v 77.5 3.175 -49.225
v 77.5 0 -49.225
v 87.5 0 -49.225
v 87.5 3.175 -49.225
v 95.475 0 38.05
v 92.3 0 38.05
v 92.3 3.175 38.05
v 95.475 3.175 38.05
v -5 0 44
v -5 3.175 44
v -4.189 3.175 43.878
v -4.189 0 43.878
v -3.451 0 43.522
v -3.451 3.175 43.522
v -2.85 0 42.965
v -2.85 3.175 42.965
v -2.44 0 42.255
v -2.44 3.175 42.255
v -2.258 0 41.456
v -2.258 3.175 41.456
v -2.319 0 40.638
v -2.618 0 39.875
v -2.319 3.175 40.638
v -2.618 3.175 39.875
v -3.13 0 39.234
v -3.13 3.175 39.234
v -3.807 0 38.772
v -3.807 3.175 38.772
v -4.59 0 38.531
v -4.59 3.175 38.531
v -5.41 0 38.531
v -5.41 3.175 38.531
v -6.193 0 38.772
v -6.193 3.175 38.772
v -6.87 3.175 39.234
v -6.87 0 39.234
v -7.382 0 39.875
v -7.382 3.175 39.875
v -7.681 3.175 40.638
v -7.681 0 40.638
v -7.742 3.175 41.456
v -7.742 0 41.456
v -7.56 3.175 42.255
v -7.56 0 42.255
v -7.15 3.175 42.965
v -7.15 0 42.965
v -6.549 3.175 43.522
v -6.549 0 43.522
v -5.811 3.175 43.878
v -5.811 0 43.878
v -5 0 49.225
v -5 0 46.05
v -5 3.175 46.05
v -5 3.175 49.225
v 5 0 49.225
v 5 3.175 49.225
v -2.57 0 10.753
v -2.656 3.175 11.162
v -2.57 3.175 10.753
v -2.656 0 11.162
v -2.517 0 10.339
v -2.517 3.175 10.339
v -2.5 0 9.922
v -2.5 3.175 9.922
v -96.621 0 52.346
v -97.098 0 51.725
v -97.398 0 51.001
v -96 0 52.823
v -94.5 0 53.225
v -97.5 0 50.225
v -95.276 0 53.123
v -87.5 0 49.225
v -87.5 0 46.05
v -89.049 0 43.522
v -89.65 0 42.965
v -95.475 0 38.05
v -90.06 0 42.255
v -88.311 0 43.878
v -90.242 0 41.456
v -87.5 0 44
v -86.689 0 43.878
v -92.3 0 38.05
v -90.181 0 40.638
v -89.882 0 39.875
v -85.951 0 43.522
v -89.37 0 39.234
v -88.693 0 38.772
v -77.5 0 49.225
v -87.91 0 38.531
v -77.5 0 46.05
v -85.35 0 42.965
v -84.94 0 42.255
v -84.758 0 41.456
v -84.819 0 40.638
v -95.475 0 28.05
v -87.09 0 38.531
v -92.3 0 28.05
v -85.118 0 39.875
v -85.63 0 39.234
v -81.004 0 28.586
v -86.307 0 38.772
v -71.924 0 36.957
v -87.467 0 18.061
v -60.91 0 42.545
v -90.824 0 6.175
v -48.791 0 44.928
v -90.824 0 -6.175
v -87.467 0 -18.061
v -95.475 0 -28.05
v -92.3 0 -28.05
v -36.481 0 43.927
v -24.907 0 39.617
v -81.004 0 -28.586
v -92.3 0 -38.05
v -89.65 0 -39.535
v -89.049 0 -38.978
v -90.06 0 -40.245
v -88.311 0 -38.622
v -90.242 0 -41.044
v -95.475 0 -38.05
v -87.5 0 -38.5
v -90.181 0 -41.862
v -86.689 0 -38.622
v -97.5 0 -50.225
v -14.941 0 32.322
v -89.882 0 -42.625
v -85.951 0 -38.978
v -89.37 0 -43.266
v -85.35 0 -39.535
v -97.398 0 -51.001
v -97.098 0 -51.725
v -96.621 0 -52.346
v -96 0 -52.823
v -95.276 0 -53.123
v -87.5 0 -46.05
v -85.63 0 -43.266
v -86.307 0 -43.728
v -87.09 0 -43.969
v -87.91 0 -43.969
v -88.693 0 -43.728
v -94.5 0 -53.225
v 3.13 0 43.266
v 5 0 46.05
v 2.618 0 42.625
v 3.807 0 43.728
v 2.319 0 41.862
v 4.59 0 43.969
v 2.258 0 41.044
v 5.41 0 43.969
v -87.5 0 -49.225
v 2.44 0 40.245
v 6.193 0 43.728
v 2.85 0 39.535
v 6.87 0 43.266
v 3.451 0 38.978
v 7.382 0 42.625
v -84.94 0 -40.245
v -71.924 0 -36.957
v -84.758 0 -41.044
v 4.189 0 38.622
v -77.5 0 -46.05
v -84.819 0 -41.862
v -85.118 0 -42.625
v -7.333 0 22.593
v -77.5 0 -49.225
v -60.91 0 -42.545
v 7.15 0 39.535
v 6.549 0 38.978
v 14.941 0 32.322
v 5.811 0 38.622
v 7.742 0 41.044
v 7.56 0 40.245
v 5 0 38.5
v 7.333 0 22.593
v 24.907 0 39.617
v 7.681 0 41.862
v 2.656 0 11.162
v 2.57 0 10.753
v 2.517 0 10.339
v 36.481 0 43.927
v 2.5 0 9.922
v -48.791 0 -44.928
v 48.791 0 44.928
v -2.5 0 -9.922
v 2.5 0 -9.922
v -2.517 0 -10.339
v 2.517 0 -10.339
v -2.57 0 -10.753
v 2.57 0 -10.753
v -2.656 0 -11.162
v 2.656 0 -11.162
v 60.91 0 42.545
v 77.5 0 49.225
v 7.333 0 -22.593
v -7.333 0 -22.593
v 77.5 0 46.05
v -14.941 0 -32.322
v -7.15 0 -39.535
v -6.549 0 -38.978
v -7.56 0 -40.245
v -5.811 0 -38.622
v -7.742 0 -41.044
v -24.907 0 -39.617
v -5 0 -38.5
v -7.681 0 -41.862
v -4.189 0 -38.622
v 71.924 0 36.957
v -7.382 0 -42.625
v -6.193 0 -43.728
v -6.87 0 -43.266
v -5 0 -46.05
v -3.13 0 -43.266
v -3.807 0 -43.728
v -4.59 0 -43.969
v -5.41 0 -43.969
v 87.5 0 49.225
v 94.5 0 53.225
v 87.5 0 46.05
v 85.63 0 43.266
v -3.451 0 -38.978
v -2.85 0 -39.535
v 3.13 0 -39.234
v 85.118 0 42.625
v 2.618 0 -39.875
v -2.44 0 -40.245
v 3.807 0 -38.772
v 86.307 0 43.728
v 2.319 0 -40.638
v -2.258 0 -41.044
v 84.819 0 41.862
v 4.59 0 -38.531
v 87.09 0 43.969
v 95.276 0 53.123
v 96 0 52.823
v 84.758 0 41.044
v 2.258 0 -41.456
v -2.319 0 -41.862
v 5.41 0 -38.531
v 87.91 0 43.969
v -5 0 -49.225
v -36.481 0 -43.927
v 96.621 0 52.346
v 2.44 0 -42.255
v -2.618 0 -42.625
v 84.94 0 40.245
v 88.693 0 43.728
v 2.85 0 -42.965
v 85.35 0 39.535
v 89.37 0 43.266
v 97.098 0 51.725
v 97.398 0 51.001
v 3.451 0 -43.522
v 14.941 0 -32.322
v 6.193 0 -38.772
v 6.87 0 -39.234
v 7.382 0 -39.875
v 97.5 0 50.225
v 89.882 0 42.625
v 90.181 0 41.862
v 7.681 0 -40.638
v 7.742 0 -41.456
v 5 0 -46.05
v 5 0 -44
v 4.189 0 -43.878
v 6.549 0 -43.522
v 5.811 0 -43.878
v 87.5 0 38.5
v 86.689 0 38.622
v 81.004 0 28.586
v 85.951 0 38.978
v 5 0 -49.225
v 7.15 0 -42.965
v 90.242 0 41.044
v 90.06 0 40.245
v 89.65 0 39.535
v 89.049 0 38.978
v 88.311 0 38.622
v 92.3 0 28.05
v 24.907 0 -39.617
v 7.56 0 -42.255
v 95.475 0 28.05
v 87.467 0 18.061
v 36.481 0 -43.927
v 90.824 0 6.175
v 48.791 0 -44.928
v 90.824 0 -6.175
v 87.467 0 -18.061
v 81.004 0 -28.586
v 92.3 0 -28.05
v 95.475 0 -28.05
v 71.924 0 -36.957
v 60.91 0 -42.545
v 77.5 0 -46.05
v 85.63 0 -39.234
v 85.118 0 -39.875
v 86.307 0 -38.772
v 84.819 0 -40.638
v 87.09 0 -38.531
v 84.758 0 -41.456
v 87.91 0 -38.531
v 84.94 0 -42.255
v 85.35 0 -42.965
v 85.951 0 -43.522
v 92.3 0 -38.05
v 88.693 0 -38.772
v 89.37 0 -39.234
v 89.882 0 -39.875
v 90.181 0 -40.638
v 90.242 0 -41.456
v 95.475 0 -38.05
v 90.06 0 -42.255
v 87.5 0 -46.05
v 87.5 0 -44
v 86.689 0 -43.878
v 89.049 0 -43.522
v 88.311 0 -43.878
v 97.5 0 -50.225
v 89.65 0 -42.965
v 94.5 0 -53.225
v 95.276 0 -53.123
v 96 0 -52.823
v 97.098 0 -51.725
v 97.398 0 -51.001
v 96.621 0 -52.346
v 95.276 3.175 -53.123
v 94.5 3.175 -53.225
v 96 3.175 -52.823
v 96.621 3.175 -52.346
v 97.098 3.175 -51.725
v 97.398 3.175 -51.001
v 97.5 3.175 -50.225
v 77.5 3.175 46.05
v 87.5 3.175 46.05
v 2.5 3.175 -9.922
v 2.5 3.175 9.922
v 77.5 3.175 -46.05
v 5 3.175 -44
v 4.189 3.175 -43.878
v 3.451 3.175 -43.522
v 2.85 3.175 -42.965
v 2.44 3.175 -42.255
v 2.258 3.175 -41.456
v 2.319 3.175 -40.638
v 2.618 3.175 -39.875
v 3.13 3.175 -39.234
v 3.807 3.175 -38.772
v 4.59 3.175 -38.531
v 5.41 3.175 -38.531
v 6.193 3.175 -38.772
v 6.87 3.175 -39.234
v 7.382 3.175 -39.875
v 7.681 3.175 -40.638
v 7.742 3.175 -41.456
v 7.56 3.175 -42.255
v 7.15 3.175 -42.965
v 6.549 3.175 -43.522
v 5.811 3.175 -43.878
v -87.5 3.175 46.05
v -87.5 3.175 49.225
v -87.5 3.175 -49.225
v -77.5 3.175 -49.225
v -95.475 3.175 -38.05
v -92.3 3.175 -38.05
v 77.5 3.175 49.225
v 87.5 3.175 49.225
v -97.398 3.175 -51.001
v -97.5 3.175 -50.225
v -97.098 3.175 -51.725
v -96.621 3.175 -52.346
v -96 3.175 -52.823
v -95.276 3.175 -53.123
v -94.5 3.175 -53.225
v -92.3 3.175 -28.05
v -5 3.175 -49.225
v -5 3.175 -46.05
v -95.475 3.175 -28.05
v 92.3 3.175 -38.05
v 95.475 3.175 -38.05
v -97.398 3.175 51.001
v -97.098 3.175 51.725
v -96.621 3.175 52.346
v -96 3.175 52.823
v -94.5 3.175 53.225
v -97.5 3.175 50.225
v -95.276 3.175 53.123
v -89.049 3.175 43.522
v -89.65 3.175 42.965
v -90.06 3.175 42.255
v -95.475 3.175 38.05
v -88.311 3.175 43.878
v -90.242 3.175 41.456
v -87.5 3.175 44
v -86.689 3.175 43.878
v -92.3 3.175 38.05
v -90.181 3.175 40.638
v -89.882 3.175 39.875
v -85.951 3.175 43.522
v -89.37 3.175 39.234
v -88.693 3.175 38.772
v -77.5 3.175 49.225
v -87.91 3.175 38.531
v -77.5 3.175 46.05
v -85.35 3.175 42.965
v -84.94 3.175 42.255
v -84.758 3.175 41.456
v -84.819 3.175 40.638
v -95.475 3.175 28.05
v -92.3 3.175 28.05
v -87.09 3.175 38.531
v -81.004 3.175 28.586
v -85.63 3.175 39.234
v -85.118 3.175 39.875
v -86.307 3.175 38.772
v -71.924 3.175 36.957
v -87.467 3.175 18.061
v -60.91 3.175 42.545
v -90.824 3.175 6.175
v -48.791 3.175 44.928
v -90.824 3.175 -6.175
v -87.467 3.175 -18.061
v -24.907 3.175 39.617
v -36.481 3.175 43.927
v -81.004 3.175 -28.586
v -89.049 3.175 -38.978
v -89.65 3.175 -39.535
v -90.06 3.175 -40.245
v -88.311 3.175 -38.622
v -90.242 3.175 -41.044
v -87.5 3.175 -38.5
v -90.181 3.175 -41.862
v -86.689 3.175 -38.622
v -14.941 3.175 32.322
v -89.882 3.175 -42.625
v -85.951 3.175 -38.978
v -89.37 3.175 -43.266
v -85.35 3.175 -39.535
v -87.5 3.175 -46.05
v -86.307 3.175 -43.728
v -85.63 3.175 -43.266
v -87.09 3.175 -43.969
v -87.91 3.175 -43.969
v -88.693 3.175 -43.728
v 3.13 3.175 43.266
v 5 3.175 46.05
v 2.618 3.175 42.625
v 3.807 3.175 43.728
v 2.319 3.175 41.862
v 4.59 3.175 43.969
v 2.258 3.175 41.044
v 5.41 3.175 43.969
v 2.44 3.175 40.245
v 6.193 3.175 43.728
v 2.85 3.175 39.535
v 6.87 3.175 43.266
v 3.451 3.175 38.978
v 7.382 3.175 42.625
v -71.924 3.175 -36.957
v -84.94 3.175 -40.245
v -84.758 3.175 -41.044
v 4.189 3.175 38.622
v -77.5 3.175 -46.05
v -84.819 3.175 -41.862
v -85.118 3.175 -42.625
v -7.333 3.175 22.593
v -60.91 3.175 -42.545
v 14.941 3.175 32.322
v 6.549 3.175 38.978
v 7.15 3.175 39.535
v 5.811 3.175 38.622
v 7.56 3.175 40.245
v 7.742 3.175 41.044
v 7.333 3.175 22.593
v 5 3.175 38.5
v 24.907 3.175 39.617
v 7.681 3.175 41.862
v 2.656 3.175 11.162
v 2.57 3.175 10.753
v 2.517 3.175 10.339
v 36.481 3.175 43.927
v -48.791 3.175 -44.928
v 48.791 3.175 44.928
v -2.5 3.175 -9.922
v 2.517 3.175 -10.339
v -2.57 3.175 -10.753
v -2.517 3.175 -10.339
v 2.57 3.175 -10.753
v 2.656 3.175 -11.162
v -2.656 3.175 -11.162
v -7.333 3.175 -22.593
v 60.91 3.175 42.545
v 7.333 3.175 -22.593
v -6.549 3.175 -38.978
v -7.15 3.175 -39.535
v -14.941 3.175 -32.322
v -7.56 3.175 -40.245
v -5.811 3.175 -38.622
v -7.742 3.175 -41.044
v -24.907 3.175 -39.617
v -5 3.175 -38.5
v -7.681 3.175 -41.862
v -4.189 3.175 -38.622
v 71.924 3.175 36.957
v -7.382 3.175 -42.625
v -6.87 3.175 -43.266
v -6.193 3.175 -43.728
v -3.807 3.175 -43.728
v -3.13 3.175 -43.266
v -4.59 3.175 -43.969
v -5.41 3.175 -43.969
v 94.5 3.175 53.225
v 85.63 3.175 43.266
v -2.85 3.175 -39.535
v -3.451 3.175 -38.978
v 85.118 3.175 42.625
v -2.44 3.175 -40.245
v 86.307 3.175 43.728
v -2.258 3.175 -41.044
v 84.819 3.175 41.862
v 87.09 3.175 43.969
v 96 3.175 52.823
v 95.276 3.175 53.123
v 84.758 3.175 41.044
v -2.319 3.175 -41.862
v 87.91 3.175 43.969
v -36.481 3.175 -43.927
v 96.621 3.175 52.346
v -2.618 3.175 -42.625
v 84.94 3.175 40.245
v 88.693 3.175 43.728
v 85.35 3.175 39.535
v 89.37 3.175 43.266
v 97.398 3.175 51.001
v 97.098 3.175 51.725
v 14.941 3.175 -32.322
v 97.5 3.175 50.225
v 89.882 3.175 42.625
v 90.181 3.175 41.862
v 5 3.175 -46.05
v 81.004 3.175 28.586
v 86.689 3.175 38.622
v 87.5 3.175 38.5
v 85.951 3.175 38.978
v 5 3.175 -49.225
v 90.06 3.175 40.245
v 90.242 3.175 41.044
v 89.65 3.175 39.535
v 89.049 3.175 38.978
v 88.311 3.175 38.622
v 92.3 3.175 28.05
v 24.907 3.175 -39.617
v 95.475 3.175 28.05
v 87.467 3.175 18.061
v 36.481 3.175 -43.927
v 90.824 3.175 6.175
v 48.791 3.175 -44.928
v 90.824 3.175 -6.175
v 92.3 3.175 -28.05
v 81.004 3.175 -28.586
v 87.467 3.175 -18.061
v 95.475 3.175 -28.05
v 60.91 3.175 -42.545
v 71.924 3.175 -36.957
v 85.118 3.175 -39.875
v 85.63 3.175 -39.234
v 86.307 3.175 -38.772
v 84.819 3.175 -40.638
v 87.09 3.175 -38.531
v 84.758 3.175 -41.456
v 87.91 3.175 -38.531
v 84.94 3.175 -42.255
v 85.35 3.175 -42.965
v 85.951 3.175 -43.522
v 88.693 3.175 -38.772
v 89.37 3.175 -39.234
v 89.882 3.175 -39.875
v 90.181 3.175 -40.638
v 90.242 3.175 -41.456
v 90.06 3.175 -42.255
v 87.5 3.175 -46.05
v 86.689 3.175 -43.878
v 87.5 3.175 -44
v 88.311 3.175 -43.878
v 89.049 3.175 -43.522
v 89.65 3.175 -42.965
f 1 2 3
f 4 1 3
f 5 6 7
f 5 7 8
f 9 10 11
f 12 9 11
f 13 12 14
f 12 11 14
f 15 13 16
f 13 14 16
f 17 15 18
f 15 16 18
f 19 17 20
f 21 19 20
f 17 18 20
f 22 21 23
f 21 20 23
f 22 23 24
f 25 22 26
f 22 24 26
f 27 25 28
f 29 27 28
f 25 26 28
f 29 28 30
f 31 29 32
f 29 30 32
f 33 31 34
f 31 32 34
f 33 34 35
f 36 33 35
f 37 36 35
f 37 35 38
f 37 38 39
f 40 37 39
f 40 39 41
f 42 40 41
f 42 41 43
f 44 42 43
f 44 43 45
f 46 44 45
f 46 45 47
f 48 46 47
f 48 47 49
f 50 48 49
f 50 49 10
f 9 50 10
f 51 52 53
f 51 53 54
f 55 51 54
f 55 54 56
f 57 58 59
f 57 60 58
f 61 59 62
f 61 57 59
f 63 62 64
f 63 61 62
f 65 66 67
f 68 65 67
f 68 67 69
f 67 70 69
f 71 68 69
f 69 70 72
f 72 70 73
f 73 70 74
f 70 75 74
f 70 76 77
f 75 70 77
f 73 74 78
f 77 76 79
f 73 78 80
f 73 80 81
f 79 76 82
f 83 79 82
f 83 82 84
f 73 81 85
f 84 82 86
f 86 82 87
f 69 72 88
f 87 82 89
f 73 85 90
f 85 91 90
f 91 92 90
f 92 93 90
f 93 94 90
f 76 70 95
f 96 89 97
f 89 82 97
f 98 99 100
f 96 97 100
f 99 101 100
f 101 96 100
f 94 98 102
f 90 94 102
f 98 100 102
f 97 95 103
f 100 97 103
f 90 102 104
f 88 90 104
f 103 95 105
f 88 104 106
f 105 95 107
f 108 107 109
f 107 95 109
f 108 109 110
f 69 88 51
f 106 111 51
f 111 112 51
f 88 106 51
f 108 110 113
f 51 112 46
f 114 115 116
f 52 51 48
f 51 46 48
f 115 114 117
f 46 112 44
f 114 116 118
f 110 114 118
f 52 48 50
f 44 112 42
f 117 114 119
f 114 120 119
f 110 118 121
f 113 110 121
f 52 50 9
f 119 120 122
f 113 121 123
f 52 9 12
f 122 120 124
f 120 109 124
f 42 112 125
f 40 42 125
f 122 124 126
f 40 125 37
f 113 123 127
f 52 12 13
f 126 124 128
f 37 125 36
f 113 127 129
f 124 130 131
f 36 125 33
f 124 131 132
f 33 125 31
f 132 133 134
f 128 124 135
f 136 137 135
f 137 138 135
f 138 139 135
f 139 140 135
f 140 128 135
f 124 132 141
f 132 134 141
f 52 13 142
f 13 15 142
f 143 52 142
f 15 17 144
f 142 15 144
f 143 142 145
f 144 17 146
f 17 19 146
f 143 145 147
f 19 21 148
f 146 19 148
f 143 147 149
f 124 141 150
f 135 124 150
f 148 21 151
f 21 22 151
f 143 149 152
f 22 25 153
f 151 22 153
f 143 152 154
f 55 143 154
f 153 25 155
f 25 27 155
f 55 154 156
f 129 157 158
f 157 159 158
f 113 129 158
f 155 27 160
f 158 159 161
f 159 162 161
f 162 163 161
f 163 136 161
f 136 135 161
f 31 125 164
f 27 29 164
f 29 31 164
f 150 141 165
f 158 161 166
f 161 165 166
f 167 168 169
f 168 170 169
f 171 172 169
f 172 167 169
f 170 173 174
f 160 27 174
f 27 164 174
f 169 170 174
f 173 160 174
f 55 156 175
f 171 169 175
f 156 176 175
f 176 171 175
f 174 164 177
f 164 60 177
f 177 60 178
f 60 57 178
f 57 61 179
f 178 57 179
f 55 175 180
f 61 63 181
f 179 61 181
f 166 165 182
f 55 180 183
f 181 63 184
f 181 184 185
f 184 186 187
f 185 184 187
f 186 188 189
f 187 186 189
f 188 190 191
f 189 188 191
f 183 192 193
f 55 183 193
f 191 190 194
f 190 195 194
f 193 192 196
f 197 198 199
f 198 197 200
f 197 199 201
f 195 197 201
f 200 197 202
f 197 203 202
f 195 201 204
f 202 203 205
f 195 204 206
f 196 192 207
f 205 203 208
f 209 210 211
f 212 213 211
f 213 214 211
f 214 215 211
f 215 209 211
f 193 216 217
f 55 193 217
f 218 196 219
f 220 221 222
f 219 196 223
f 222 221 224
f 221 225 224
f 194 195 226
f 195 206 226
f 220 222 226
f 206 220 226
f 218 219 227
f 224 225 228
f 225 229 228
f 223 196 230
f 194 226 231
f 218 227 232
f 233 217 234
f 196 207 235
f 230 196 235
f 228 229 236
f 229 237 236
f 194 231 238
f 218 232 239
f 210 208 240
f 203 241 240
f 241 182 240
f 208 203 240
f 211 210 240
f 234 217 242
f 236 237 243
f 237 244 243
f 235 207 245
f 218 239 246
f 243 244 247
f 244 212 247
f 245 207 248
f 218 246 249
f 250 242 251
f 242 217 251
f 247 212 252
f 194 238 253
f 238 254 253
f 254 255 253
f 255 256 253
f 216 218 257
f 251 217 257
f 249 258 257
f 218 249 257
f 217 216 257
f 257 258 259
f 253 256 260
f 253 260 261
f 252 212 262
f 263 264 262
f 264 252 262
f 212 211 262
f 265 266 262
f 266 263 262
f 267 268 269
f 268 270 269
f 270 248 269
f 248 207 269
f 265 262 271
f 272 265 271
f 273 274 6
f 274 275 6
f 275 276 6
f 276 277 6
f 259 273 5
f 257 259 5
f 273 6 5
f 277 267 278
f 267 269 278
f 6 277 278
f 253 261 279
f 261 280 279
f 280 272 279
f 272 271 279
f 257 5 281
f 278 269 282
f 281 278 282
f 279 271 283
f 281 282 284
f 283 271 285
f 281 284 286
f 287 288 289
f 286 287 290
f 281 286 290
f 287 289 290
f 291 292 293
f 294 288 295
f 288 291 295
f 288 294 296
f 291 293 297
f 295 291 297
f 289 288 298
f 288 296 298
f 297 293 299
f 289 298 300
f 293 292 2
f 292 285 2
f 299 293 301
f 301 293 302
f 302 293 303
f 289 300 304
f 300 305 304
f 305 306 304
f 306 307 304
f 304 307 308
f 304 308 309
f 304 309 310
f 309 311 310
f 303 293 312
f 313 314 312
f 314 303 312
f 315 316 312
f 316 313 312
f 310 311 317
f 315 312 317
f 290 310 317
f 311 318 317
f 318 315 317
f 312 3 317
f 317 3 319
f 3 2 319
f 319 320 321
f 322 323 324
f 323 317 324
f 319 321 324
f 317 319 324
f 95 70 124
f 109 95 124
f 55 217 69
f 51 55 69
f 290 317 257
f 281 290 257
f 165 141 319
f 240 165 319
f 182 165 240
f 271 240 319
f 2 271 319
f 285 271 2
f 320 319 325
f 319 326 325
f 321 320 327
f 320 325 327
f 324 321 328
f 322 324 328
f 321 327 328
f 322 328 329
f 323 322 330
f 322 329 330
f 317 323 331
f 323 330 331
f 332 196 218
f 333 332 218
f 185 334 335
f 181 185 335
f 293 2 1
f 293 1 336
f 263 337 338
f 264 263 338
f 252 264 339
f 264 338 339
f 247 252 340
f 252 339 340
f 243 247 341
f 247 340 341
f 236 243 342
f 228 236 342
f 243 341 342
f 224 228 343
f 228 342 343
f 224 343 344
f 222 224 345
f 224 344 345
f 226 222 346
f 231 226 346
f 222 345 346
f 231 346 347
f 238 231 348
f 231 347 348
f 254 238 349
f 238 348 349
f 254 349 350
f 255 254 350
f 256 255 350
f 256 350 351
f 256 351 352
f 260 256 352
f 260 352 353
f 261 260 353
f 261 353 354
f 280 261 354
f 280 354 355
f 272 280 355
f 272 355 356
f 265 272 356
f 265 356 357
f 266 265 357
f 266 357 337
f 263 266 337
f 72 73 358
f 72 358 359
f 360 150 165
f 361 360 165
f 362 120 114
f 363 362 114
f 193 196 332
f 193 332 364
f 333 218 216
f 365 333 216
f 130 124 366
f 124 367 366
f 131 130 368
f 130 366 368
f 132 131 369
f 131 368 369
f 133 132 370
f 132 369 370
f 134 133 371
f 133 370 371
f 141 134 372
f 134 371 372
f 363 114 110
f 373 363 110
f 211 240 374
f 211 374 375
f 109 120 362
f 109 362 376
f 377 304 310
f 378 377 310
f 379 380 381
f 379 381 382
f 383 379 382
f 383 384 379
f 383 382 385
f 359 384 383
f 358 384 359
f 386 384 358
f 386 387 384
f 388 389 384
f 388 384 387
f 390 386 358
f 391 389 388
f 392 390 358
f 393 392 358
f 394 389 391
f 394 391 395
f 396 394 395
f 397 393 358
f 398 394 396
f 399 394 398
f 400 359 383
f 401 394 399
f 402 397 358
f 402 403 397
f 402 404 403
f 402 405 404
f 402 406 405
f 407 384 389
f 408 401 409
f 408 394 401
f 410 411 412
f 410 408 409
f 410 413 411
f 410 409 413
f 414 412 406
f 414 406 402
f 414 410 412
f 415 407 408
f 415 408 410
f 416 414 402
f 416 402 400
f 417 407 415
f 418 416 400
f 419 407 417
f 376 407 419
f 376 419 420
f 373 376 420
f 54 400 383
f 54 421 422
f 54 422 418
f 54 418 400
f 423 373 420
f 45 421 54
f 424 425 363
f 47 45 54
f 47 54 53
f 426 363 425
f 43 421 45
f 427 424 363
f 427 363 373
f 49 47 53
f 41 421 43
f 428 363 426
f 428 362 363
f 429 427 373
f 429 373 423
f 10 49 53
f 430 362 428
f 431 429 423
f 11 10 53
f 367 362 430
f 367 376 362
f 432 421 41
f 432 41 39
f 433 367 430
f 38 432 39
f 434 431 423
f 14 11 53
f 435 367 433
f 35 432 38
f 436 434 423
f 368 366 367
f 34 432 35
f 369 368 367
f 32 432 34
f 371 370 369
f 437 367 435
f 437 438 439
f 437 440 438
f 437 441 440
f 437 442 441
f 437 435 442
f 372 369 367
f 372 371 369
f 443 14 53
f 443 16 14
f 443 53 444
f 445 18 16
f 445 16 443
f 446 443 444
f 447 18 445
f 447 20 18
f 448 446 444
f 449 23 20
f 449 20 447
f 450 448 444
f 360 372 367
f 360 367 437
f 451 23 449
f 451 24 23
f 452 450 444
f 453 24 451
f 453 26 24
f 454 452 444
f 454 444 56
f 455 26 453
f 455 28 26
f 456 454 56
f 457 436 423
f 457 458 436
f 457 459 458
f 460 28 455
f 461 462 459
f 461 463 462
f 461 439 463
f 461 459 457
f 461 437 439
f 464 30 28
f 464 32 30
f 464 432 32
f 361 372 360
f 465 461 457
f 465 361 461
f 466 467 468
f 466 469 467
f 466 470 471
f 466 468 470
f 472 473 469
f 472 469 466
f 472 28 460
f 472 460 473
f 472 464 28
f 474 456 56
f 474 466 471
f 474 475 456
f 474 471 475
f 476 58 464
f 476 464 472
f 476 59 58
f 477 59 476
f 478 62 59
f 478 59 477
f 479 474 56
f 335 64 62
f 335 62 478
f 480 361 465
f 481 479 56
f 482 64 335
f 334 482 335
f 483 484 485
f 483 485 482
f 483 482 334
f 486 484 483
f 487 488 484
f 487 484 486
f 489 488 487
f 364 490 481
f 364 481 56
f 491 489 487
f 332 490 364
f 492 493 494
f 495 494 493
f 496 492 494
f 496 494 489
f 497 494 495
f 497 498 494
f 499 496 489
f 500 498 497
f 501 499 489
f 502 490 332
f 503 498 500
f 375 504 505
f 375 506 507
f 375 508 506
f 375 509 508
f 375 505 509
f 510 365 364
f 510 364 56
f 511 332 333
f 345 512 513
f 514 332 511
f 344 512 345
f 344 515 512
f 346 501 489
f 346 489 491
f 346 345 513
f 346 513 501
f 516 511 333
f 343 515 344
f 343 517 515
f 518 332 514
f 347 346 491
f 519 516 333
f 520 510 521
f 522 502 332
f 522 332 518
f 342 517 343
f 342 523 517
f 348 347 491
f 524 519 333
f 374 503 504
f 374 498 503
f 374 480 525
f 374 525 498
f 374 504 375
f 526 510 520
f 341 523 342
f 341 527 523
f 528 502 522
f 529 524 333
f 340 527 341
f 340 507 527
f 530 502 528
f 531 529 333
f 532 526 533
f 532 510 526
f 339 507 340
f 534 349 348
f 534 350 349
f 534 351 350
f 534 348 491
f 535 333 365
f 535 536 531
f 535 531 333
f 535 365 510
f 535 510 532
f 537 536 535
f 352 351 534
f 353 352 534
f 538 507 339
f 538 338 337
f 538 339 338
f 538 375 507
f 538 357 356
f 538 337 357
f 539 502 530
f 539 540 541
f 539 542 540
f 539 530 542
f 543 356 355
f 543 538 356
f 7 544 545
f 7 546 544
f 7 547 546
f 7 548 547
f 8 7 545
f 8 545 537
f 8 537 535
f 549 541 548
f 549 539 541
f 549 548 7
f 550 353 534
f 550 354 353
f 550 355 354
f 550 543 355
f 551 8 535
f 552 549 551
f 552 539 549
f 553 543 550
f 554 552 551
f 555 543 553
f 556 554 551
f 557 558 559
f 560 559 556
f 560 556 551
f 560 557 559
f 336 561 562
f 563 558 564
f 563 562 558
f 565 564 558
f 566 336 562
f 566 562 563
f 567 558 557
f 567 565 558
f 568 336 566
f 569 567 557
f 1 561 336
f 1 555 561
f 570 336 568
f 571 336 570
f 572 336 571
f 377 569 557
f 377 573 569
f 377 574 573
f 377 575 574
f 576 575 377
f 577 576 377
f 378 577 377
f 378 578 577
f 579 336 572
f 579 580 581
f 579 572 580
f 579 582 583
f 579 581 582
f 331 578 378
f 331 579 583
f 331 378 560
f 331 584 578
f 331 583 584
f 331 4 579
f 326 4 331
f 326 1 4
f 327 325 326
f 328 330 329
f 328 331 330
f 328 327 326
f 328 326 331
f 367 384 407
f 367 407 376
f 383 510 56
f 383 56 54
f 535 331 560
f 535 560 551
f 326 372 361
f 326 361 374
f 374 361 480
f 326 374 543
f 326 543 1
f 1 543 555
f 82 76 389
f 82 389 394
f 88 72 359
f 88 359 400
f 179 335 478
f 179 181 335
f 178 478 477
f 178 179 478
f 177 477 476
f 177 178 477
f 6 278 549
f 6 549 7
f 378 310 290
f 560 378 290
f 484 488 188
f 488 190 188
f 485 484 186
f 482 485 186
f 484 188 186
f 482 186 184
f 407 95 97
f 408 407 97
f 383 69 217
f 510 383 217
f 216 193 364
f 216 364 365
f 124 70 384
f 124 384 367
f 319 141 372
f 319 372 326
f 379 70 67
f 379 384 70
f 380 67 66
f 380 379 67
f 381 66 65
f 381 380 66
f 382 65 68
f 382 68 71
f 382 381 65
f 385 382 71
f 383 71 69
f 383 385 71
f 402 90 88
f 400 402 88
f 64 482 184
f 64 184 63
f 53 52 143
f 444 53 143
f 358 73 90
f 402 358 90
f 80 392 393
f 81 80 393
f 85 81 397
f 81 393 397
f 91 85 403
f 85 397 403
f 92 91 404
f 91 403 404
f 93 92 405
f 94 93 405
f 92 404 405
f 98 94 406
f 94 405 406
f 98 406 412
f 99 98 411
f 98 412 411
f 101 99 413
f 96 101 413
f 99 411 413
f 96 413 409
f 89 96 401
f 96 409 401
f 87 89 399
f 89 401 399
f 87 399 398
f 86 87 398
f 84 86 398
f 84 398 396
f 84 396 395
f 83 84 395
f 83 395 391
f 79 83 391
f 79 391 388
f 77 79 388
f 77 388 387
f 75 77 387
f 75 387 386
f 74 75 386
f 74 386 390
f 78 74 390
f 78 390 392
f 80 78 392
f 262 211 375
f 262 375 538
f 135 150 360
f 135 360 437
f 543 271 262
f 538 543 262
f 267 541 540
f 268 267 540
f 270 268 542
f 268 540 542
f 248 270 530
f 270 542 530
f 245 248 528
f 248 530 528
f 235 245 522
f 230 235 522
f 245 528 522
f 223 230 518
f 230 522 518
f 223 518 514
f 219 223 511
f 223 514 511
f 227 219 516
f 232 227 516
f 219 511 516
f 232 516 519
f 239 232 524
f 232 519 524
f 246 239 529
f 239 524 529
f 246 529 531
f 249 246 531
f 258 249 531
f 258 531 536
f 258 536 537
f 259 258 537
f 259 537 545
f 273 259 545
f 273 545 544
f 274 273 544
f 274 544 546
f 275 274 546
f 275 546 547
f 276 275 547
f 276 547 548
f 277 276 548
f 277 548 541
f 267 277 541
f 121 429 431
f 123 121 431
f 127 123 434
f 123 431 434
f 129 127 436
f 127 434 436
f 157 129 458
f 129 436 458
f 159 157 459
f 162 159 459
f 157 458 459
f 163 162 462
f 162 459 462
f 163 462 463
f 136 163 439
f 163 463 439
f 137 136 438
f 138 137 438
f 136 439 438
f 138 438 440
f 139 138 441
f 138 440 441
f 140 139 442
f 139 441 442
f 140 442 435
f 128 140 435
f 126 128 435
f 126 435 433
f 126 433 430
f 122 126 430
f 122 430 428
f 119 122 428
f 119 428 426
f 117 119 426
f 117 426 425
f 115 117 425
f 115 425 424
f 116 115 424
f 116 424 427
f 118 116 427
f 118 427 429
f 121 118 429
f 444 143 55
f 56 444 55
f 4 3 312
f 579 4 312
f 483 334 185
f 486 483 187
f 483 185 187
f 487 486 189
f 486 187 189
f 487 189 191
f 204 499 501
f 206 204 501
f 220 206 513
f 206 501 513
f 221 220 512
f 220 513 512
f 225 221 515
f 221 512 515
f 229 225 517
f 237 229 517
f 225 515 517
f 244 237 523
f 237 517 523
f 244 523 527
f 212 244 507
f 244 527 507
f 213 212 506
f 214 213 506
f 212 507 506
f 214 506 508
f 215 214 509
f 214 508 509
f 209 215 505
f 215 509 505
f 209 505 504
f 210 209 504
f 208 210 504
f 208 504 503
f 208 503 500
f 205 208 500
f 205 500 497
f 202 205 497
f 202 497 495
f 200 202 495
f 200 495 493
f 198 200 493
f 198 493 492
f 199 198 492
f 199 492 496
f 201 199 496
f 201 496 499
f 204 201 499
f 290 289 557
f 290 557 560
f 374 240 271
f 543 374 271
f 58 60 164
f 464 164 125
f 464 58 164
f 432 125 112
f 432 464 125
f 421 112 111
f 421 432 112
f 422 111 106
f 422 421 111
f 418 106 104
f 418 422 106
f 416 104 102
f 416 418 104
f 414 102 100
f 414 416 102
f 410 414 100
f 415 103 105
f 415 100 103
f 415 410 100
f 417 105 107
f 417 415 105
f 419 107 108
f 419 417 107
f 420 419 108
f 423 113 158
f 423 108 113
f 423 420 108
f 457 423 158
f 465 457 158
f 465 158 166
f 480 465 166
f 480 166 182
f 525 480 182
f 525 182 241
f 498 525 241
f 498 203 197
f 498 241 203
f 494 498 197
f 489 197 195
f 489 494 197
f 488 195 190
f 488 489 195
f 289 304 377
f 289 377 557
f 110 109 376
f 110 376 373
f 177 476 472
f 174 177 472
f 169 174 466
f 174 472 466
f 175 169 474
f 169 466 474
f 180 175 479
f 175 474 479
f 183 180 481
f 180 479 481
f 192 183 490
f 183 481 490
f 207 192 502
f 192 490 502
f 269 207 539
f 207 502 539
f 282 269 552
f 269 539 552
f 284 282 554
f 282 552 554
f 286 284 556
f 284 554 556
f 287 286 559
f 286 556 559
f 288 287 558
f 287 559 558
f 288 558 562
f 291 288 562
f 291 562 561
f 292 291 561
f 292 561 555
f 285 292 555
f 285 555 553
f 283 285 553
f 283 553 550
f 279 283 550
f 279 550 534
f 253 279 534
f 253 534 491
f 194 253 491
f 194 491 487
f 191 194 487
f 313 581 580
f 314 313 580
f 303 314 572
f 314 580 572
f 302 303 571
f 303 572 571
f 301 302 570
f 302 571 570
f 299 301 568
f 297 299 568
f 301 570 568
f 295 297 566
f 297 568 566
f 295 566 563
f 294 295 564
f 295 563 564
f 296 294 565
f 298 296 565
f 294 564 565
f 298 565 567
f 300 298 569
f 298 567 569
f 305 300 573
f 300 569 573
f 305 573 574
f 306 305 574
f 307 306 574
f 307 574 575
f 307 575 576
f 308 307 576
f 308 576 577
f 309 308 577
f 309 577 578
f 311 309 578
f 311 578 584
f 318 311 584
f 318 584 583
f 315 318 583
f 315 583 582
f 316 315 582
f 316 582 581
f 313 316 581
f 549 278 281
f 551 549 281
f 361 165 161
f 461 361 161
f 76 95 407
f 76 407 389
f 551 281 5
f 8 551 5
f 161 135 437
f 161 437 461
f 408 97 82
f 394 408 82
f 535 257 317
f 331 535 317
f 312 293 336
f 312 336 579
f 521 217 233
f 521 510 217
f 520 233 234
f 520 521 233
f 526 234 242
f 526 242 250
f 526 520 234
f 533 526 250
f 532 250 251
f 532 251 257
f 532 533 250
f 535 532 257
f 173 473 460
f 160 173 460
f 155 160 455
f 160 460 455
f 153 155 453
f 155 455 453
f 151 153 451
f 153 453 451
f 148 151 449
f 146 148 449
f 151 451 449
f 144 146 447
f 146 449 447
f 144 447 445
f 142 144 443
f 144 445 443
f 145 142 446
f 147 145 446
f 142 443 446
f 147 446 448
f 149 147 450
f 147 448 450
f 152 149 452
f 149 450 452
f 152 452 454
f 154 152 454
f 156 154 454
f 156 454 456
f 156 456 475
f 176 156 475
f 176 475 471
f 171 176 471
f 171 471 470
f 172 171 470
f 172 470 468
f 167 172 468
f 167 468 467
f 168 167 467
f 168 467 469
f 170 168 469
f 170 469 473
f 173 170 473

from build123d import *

# Parameters (mm, degrees)
SKETCH1_W           = 195
SKETCH1_H           = 106.45
BOSS_EXTRUDE1_DEPTH = 3.175
SKETCH2_R           = 2.75
CUT_EXTRUDE1_DEPTH  = 112.127095031
FILLET1_R           = 5
FILLET2_R           = 3
SKETCH4_W           = 10
SKETCH4_H           = 3.175
SKETCH4_W_2         = 3.175
SKETCH4_H_2         = 10
CUT_EXTRUDE2_DEPTH  = 112.127095031


with BuildPart() as part:
    # Sketch1 → Boss-Extrude1 (new body)
    with BuildSketch(Plane(origin=(0, 0, 0), x_dir=(1, 0, 0), z_dir=(0, 1, 0))):
        Rectangle(SKETCH1_W, SKETCH1_H)
    extrude(amount=BOSS_EXTRUDE1_DEPTH)

    # Sketch2 → Cut-Extrude1 (cut, through all)
    with BuildSketch(Plane(origin=(0, 3.175, 0), x_dir=(1, 0, 0), z_dir=(0, 1, 0))):
        with Locations((-87.5, 41.25)):
            Circle(SKETCH2_R)
        with Locations((-5, 41.25)):
            Circle(SKETCH2_R)
        with Locations((-5, -41.25)):
            Circle(SKETCH2_R)
        with Locations((-87.5, -41.25)):
            Circle(SKETCH2_R)
        with Locations((5, 41.25)):
            Circle(SKETCH2_R)
        with Locations((5, -41.25)):
            Circle(SKETCH2_R)
        with Locations((87.5, -41.25)):
            Circle(SKETCH2_R)
        with Locations((87.5, 41.25)):
            Circle(SKETCH2_R)
        with BuildLine():
            Line((-2.5, 10.532687216), (-2.5, -10.532687216))
            ThreePointArc((-2.5, -10.532687216), (-91.25, 0), (-2.5, 10.532687216))
        make_face()
        with BuildLine():
            Line((2.5, 10.532687216), (2.5, -10.532687216))
            ThreePointArc((2.5, -10.532687216), (91.25, 0), (2.5, 10.532687216))
        make_face()
    extrude(amount=-CUT_EXTRUDE1_DEPTH, mode=Mode.SUBTRACT)

    # Fillet1
    fillet1_edges = [part.edges().sort_by_distance(p)[0] for p in [
        (-2.5, 1.5875, -10.532687216),
        (-2.5, 1.5875, 10.532687216),
        (2.5, 1.5875, 10.532687216),
        (2.5, 1.5875, -10.532687216),
    ]]
    fillet(fillet1_edges, radius=FILLET1_R)

    # Fillet2
    fillet2_edges = [part.edges().sort_by_distance(p)[0] for p in [
        (97.5, 1.5875, -53.225),
        (97.5, 1.5875, 53.225),
        (-97.5, 1.5875, 53.225),
        (-97.5, 1.5875, -53.225),
    ]]
    fillet(fillet2_edges, radius=FILLET2_R)

    # Sketch4 → Cut-Extrude2 (cut, through all)
    with BuildSketch(Plane.XZ):
        with Locations((-82.5, 47.6375)):
            Rectangle(SKETCH4_W, SKETCH4_H)
        with Locations((0, 47.6375)):
            Rectangle(SKETCH4_W, SKETCH4_H)
        with Locations((82.5, 47.6375)):
            Rectangle(SKETCH4_W, SKETCH4_H)
        with Locations((82.5, -47.6375)):
            Rectangle(SKETCH4_W, SKETCH4_H)
        with Locations((0, -47.6375)):
            Rectangle(SKETCH4_W, SKETCH4_H)
        with Locations((-82.5, -47.6375)):
            Rectangle(SKETCH4_W, SKETCH4_H)
        with Locations((93.8875, -33.05)):
            Rectangle(SKETCH4_W_2, SKETCH4_H_2)
        with Locations((93.8875, 33.05)):
            Rectangle(SKETCH4_W_2, SKETCH4_H_2)
        with Locations((-93.8875, 33.05)):
            Rectangle(SKETCH4_W_2, SKETCH4_H_2)
        with Locations((-93.8875, -33.05)):
            Rectangle(SKETCH4_W_2, SKETCH4_H_2)
    extrude(amount=-CUT_EXTRUDE2_DEPTH, mode=Mode.SUBTRACT)


solid = part.part
